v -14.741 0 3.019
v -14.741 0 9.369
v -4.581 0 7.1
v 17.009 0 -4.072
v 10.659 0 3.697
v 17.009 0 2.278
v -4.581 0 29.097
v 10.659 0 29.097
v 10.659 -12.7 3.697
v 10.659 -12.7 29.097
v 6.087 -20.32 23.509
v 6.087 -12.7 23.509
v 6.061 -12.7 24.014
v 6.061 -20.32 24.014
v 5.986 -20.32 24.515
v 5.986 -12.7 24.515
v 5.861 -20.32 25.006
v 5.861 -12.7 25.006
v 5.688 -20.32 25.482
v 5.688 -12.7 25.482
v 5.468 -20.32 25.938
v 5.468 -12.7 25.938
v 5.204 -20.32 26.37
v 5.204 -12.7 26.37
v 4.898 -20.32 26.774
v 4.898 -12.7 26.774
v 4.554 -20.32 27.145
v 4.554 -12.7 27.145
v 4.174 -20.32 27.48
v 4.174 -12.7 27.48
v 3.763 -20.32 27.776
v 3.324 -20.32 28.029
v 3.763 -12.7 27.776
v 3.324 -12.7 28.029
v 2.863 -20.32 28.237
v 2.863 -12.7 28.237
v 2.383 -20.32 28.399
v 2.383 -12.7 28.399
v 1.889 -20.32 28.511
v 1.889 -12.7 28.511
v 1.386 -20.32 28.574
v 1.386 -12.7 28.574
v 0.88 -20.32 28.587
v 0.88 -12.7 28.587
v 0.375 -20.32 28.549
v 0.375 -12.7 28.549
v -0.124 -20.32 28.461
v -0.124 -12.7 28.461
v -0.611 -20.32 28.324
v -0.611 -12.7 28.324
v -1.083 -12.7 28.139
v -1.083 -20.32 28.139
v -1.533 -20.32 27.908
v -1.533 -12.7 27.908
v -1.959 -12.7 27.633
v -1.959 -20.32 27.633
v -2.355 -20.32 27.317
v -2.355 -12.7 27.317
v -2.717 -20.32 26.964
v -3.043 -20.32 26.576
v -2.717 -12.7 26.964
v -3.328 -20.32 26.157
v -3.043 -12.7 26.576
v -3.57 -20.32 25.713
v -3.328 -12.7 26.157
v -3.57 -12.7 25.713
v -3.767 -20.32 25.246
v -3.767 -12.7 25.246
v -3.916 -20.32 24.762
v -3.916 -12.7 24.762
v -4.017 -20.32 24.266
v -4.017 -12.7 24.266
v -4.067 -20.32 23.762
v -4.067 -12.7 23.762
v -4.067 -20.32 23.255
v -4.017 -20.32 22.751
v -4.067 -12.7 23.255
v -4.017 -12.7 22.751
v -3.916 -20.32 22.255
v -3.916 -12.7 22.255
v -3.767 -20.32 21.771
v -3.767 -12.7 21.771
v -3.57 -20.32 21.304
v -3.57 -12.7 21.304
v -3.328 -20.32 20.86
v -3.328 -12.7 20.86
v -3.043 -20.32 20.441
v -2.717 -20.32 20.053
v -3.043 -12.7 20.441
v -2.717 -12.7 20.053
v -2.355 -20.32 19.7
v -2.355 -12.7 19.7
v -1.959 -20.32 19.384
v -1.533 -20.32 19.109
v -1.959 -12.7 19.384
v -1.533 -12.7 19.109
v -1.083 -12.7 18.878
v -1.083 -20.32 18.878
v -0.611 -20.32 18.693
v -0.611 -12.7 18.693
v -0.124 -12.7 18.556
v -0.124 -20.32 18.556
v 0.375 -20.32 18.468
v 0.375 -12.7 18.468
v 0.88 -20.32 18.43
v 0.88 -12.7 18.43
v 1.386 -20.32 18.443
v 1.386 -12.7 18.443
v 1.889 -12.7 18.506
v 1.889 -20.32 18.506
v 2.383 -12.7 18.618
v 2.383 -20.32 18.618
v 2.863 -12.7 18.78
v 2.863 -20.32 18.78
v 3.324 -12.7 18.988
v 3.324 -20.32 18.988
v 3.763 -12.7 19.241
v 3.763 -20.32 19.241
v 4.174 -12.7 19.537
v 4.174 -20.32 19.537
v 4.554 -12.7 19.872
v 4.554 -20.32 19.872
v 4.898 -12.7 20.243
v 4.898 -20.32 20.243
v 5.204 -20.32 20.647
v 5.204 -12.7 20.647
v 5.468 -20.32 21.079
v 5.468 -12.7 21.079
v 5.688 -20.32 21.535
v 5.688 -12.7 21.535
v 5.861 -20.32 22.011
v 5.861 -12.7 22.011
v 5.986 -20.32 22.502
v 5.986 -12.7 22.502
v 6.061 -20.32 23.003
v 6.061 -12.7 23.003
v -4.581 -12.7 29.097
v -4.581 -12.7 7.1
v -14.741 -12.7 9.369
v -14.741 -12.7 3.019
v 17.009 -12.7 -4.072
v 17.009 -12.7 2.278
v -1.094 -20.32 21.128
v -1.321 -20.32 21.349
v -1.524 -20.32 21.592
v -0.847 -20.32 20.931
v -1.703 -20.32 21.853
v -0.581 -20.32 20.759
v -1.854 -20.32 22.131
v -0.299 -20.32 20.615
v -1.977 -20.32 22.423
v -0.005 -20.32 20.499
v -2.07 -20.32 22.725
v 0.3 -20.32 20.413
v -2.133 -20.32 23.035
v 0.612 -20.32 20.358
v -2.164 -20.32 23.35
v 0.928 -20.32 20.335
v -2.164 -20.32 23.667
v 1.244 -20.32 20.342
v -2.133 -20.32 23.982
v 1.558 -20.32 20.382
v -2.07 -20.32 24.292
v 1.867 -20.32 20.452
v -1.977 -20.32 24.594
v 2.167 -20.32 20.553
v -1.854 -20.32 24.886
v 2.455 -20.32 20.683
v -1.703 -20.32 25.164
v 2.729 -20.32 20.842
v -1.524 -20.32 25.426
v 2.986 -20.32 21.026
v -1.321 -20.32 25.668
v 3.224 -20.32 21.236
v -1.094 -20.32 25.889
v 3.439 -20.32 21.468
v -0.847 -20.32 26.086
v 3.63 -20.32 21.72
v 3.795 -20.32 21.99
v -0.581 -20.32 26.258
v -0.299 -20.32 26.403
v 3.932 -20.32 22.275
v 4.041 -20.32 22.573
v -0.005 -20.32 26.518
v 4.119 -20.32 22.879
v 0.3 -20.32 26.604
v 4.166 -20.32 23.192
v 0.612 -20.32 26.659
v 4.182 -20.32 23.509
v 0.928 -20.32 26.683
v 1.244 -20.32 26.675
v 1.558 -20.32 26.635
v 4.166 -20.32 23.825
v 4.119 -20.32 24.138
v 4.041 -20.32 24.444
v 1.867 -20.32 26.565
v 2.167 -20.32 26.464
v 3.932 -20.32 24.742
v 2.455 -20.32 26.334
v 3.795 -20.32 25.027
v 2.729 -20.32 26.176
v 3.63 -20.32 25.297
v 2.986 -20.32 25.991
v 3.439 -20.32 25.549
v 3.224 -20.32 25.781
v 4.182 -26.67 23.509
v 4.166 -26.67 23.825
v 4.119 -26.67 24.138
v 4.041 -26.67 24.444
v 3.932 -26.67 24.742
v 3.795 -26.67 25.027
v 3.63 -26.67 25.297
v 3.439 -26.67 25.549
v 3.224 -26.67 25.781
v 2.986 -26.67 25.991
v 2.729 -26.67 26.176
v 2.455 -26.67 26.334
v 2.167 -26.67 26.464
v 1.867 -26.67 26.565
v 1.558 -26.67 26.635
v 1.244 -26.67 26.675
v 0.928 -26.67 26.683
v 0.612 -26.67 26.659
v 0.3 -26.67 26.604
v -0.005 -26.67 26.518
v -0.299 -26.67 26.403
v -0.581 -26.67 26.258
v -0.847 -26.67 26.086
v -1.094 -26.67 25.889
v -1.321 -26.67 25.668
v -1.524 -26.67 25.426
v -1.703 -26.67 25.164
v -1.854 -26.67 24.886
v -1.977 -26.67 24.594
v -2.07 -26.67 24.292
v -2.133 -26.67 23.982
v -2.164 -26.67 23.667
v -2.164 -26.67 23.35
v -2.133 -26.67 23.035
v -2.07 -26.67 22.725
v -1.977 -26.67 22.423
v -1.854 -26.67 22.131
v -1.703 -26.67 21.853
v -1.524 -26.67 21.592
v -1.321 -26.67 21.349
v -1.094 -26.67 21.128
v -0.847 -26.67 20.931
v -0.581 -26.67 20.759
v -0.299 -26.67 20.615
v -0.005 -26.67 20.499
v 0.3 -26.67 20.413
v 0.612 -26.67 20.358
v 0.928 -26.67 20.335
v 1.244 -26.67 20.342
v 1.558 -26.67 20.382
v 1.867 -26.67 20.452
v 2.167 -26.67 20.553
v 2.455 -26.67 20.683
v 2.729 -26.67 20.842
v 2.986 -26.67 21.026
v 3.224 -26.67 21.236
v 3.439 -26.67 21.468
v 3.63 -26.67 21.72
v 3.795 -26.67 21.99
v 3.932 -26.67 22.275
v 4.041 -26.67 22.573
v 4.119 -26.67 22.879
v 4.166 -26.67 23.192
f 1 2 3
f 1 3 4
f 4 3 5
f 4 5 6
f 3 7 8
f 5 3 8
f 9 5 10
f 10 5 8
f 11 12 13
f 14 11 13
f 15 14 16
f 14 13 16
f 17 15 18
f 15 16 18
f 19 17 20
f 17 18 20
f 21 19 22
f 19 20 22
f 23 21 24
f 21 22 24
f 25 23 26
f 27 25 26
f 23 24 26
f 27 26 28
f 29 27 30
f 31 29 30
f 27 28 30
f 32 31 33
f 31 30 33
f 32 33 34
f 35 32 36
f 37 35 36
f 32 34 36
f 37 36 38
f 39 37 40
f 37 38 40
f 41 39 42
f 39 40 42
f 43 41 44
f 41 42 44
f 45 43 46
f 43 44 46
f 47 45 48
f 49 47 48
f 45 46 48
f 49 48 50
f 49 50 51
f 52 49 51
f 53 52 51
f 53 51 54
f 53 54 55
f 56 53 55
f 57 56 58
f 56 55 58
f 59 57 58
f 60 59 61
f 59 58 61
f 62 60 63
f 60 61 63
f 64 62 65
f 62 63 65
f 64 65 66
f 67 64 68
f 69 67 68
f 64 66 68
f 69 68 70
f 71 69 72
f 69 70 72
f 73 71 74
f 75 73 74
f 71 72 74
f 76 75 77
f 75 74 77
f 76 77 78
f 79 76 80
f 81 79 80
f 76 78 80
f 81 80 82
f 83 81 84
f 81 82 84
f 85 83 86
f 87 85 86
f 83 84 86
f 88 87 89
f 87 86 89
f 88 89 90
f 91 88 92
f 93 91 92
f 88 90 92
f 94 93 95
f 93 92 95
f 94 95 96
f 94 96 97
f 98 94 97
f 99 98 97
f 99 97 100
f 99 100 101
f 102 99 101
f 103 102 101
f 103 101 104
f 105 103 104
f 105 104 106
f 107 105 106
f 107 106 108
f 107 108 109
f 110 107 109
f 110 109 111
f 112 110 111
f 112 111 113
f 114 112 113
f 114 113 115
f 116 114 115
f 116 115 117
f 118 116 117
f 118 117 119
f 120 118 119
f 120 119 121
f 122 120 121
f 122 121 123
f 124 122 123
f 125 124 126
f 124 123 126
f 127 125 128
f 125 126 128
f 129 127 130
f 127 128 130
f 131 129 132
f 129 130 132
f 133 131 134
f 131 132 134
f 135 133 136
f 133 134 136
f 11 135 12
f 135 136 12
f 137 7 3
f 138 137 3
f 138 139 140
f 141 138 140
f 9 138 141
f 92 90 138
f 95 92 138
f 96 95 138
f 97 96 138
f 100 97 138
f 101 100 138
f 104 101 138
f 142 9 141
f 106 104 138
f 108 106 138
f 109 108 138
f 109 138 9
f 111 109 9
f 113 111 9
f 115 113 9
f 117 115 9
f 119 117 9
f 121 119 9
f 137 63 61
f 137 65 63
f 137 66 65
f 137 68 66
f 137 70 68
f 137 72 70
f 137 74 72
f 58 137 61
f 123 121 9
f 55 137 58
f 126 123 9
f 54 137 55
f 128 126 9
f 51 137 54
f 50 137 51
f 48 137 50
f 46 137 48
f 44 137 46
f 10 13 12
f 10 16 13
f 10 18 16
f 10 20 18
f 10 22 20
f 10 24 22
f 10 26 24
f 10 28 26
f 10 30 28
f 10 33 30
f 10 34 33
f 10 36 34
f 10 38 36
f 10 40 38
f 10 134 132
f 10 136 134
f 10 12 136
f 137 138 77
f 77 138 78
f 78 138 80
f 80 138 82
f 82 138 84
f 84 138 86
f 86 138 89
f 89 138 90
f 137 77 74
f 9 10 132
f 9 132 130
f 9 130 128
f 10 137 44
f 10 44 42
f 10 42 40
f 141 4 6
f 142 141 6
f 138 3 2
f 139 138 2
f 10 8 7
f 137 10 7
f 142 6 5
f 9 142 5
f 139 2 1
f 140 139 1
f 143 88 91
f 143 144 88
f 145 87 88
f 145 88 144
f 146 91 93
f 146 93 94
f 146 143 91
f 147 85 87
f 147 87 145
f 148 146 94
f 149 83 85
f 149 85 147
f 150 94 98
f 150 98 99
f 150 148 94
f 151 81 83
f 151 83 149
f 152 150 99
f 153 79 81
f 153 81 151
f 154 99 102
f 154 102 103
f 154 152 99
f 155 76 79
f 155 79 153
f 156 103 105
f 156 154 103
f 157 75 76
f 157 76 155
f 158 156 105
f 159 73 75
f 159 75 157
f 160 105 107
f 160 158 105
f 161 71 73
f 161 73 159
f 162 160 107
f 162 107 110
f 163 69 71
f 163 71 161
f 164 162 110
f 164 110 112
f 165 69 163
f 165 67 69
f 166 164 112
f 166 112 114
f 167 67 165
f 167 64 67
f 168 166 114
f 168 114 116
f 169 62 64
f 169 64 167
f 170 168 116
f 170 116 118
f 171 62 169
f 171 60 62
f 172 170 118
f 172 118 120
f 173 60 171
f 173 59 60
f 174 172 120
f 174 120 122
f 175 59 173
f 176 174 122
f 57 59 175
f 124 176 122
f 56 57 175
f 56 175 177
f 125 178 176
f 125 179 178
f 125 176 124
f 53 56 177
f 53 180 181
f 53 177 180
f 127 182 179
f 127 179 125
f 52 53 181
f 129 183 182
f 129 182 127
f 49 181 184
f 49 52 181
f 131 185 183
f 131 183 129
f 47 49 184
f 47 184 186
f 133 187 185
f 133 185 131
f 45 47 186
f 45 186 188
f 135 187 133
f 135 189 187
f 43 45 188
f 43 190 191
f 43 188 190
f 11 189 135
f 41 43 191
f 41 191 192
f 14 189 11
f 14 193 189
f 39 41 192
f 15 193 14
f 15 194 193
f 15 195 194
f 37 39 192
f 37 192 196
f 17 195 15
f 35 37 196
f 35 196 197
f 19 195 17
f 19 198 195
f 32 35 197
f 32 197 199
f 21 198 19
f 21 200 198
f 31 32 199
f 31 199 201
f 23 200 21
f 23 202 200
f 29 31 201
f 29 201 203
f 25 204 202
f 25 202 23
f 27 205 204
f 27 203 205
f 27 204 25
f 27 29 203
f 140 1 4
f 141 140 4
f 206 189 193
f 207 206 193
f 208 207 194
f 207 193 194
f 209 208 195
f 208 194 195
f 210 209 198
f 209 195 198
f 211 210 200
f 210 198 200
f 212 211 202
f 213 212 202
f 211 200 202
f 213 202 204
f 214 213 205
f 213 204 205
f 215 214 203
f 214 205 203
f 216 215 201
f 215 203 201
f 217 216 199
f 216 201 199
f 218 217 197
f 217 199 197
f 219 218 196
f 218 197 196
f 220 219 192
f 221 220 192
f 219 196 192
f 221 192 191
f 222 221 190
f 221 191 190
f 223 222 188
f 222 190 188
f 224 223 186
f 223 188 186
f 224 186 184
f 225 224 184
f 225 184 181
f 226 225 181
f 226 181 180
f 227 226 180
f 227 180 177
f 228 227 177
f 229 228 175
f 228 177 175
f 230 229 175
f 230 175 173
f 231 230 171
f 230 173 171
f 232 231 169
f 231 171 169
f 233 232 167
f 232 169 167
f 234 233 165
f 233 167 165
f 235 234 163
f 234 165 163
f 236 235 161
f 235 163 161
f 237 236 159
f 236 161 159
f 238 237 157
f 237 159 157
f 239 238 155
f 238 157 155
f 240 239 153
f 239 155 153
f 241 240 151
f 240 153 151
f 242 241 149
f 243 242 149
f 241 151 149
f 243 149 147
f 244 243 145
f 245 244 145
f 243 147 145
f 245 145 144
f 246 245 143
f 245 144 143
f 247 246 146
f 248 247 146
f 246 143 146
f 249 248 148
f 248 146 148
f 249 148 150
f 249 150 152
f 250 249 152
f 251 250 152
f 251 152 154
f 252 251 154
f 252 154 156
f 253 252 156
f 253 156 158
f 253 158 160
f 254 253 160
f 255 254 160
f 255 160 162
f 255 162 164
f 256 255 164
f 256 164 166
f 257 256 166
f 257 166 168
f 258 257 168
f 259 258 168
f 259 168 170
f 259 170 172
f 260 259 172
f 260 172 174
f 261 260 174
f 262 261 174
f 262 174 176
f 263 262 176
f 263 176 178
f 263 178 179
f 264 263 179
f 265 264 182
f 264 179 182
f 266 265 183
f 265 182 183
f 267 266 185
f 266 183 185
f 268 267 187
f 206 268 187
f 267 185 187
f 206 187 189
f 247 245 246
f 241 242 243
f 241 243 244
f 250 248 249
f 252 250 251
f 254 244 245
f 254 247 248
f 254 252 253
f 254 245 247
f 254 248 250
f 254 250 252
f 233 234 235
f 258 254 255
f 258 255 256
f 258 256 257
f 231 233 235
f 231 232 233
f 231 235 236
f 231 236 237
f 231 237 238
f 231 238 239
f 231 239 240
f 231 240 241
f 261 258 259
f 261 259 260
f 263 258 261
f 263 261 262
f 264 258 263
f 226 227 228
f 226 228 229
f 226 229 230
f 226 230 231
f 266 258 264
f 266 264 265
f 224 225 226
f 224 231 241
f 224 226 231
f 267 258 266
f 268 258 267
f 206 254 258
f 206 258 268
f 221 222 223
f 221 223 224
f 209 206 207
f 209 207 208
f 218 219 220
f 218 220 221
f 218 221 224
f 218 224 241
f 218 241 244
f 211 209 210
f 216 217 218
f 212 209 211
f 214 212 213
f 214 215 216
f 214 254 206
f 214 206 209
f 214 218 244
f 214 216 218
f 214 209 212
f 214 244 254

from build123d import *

# Parameters (mm, degrees)
F1_DEPTH = 12.7
F2_R     = 5.08
F3_DEPTH = 7.62
F4_R     = 3.175
F5_DEPTH = 6.35


with BuildPart() as f1:
    # F0 (on Front) → F1 (new body)
    with BuildSketch(Plane.XZ):
        Polygon((-4.581327, 29.096584), (-4.581327, 7.100181), (10.658673, 3.696584), (10.658673, 29.096584), align=None)
        Polygon((-4.581327, 7.100181), (-14.741327, 9.369245), (-14.741327, 3.019245), (17.008673, -4.071582), (17.008673, 2.278418), (10.658673, 3.696584), align=None)
    extrude(amount=F1_DEPTH)

    # F2 (on face) → F3 (join)
    with BuildSketch(Plane.XZ.offset(12.7)):
        with Locations((1.006673, 23.508584)):
            Circle(F2_R)
    extrude(amount=F3_DEPTH)

    # F4 (on face) → F5 (join)
    with BuildSketch(Plane.XZ.offset(20.32)):
        with Locations((1.006673, 23.508584)):
            Circle(F4_R)
    extrude(amount=F5_DEPTH)


solid = f1.part
